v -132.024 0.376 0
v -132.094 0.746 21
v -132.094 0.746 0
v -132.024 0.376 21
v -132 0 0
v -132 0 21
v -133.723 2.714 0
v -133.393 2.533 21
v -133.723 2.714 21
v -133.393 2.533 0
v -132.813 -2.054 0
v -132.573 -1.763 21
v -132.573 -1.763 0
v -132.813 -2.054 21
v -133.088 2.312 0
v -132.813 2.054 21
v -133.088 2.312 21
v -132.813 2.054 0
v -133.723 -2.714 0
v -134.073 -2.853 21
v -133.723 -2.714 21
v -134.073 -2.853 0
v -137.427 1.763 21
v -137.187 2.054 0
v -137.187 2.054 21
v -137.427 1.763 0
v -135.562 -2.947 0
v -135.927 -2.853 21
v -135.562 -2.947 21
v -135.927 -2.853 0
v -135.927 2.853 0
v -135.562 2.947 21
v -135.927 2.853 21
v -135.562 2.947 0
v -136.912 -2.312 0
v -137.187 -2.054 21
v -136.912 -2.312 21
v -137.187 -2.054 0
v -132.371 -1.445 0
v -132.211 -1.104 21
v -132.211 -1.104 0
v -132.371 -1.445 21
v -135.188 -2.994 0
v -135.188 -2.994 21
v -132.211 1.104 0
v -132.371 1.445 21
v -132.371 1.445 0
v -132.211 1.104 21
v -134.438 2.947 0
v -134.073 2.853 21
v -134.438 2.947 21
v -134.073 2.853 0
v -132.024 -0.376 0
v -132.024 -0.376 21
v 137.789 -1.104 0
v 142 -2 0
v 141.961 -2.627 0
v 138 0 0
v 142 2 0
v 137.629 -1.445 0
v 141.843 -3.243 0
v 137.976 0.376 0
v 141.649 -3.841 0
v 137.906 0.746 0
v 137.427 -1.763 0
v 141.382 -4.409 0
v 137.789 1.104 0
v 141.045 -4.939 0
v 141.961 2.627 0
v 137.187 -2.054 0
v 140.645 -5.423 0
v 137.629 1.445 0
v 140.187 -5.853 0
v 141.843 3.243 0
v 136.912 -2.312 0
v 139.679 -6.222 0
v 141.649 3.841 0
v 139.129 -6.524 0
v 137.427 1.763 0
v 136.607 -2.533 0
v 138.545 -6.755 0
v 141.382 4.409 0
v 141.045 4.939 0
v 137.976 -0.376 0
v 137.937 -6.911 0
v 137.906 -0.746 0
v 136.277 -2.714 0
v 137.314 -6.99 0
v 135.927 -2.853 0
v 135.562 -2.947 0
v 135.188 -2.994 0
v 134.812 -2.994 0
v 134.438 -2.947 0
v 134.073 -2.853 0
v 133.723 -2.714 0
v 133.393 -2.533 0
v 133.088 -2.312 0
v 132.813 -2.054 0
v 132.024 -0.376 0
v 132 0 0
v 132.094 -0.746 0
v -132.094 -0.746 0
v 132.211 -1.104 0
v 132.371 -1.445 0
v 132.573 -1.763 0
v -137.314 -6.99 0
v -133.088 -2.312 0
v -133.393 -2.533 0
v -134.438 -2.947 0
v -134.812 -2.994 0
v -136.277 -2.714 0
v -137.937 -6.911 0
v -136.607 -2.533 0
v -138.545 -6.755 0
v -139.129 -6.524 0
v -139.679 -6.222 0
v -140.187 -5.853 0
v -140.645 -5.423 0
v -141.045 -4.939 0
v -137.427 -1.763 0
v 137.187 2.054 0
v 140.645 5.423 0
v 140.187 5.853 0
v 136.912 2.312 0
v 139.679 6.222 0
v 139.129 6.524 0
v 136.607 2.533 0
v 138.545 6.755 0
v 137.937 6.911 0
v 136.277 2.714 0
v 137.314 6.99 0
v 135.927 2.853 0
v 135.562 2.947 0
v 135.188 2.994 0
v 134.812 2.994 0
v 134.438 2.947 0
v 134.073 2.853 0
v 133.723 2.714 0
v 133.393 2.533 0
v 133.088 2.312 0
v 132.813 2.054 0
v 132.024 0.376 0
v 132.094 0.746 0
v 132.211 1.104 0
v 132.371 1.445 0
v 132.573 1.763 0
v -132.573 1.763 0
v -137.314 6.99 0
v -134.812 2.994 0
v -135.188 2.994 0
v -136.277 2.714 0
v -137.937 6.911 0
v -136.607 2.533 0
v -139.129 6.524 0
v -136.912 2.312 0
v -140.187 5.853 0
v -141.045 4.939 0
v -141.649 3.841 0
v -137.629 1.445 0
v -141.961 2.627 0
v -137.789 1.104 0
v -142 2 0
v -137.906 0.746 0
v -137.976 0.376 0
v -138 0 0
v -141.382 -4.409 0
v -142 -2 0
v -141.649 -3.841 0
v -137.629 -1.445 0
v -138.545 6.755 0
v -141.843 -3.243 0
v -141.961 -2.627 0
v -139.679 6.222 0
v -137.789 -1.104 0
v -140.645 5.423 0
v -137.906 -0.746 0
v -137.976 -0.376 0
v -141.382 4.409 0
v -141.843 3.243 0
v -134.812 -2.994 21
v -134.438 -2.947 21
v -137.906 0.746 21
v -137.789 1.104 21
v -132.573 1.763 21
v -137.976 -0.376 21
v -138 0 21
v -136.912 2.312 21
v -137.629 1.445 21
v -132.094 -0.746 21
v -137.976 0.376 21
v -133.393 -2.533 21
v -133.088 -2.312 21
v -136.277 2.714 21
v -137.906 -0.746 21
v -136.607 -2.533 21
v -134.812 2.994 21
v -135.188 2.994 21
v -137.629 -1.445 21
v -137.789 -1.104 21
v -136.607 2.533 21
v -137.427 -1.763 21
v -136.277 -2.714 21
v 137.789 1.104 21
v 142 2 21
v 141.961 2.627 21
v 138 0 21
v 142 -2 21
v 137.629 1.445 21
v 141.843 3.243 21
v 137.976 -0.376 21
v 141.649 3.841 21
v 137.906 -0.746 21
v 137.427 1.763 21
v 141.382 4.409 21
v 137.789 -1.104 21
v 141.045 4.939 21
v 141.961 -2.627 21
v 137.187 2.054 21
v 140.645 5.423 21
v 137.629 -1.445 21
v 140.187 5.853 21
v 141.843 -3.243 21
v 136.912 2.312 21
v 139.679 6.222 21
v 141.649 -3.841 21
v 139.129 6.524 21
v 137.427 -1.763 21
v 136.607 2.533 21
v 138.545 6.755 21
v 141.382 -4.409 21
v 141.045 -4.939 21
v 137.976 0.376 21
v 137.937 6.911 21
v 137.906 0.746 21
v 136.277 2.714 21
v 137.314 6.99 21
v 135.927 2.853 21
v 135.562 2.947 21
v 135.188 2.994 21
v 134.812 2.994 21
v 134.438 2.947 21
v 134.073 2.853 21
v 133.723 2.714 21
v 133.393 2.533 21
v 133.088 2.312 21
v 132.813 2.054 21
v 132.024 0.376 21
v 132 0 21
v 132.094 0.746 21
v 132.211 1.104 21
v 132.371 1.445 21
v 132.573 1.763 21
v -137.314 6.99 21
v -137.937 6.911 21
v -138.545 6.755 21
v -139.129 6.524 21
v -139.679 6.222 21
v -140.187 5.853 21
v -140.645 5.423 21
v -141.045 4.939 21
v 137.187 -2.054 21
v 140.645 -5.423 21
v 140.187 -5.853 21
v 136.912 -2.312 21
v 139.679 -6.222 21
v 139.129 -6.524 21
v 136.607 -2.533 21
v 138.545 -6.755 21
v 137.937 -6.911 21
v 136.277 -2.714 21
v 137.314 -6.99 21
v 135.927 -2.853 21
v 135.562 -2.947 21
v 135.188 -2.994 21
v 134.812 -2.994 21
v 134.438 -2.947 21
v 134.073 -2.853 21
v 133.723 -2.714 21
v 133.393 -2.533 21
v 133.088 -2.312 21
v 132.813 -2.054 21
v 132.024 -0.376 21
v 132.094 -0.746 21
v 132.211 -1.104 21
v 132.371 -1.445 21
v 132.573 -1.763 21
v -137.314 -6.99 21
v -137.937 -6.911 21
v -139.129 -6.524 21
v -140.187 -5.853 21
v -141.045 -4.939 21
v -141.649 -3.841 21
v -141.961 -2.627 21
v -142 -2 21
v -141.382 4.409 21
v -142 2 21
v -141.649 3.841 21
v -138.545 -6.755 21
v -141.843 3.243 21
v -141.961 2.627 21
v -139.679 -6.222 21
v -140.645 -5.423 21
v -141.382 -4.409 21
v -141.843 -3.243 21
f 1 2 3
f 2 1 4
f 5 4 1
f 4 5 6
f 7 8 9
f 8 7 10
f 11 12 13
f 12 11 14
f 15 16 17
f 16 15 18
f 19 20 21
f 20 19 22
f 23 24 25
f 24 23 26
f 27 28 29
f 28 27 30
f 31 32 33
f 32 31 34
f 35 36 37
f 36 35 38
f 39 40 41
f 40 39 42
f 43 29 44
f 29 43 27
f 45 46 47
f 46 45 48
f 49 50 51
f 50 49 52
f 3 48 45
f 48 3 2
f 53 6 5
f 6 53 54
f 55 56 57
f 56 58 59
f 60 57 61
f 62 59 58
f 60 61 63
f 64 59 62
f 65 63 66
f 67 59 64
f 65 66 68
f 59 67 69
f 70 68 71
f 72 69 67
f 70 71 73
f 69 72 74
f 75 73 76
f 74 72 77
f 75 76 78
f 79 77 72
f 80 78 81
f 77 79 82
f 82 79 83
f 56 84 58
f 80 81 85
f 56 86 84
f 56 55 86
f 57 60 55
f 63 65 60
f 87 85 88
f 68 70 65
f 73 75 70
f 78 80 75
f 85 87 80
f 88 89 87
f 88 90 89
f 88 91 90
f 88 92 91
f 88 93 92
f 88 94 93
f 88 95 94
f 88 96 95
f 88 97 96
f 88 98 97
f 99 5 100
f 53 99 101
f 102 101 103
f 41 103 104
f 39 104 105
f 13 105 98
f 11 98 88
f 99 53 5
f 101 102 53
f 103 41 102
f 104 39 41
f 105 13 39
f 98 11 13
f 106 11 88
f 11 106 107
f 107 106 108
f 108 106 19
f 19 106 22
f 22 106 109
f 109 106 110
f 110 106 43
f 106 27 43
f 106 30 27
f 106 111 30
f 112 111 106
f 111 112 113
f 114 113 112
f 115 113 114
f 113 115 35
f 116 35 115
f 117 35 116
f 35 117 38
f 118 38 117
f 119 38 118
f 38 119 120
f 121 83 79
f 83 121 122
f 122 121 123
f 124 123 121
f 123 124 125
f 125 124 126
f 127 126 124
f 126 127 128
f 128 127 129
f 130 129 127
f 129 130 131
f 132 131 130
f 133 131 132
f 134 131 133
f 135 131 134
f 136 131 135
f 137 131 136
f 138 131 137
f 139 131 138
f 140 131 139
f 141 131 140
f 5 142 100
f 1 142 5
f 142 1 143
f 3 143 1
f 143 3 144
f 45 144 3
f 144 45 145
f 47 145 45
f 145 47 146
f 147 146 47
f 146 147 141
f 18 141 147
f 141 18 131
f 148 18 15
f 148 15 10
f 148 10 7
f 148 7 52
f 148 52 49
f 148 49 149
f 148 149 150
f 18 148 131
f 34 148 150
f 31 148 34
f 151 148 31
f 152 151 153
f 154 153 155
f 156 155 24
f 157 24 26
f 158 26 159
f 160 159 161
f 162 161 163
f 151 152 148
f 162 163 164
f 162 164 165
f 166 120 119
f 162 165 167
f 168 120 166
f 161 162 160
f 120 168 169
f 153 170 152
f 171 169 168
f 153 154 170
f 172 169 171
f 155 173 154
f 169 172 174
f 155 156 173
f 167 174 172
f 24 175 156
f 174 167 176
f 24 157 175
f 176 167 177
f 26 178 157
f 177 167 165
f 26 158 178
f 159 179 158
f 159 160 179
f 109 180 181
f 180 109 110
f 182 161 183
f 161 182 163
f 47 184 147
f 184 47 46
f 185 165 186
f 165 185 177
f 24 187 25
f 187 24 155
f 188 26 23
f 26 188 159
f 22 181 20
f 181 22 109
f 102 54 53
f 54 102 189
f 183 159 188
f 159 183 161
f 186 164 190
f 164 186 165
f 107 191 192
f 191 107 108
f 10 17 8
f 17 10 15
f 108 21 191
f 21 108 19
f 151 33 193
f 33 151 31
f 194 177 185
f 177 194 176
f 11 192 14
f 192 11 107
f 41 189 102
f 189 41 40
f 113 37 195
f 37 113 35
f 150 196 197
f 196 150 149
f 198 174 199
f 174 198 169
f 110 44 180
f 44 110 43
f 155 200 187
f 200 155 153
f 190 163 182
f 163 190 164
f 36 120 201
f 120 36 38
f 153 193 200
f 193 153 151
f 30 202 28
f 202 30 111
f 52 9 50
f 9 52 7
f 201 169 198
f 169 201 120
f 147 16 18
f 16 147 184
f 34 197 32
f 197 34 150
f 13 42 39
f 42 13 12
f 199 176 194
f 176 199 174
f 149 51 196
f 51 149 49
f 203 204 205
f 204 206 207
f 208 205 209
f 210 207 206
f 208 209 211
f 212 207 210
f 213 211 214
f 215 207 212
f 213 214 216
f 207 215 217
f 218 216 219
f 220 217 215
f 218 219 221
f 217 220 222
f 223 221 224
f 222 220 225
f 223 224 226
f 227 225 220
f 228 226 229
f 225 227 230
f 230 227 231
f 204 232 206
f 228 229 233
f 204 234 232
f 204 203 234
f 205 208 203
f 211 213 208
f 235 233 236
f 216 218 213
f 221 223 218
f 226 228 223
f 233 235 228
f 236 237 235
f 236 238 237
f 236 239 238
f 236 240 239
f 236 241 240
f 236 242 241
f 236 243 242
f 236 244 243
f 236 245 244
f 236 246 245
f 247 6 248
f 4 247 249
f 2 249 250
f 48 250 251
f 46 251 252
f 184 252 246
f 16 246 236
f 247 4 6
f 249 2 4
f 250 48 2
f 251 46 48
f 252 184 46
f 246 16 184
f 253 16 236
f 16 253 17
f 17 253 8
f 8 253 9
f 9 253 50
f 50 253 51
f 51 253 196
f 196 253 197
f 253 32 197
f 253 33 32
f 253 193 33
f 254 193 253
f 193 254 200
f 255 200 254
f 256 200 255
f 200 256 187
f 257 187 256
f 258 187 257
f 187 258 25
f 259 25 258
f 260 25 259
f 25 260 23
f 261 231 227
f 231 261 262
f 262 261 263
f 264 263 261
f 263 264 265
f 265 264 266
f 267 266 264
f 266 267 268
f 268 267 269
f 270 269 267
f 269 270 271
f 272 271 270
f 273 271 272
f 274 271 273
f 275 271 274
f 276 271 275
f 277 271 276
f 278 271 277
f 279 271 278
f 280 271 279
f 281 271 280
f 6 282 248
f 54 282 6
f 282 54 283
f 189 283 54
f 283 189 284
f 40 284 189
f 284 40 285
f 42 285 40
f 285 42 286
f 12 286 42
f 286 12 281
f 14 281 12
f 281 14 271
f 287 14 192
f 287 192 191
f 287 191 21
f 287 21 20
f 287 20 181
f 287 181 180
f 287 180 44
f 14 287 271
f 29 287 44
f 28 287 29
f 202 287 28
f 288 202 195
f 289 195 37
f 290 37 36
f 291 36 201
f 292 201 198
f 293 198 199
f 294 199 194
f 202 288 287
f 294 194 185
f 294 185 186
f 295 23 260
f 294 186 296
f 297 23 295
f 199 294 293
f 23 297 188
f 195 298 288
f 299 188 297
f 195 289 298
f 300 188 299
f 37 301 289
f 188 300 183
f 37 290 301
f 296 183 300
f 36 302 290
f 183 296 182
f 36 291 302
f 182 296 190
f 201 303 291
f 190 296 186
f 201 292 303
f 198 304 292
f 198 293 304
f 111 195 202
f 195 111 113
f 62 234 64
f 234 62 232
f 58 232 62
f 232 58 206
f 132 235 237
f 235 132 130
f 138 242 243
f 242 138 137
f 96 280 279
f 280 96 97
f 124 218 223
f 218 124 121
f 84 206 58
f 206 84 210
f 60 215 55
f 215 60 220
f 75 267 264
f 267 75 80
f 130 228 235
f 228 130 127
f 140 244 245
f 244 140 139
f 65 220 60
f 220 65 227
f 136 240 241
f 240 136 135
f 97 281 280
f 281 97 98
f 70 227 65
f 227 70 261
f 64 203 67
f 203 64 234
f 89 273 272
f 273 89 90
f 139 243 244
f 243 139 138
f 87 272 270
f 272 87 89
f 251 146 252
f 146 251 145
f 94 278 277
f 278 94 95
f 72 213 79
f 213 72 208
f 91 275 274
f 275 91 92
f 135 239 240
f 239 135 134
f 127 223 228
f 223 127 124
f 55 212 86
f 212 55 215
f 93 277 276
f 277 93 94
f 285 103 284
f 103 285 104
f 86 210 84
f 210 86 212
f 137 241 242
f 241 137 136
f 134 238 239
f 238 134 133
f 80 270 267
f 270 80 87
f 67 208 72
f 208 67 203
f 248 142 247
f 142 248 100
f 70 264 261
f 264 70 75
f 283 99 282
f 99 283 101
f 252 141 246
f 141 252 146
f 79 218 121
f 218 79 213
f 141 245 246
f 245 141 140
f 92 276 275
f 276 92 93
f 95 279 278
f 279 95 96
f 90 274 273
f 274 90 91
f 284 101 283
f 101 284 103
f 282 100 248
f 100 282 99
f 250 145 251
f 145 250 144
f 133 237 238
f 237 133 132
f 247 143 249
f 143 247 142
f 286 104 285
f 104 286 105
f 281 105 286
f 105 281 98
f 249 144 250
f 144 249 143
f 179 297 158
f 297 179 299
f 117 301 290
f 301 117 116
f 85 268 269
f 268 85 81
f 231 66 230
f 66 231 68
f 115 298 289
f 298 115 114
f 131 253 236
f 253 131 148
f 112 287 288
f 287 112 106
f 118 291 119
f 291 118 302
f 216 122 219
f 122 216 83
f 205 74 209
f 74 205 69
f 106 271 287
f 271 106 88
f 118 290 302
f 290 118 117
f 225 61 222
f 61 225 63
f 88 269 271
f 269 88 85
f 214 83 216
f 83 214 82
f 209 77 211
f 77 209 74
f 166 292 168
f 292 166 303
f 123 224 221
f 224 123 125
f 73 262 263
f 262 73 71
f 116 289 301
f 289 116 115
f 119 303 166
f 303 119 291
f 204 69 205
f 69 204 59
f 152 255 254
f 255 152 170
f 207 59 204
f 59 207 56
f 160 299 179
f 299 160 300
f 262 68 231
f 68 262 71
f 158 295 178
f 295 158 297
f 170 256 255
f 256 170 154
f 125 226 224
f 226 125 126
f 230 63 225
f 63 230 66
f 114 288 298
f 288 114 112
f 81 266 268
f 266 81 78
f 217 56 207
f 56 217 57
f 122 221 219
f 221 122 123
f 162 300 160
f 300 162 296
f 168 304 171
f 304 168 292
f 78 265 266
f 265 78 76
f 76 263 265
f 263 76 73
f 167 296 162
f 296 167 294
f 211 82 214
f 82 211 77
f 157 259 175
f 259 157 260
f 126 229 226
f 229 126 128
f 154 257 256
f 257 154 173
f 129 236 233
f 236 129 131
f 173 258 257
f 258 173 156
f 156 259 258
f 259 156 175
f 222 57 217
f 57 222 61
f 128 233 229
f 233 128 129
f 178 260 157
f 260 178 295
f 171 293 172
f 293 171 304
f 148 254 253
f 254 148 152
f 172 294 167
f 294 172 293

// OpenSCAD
$fn = 50;


difference() {
	union() {
		hull() {
			translate(v = [-137.0000000000, 2.0000000000, 0]) {
				cylinder(h = 21, r = 5);
			}
			translate(v = [137.0000000000, 2.0000000000, 0]) {
				cylinder(h = 21, r = 5);
			}
			translate(v = [-137.0000000000, -2.0000000000, 0]) {
				cylinder(h = 21, r = 5);
			}
			translate(v = [137.0000000000, -2.0000000000, 0]) {
				cylinder(h = 21, r = 5);
			}
		}
	}
	union() {
		translate(v = [-135.0000000000, 0.0000000000, 0]) {
			cylinder(h = 21, r = 3.0000000000);
		}
		translate(v = [135.0000000000, 0.0000000000, 0]) {
			cylinder(h = 21, r = 3.0000000000);
		}
		translate(v = [-135.0000000000, 0.0000000000, 0]) {
			cylinder(h = 21, r = 1.5000000000);
		}
		translate(v = [135.0000000000, 0.0000000000, 0]) {
			cylinder(h = 21, r = 1.5000000000);
		}
		translate(v = [-135.0000000000, 0.0000000000, 0]) {
			cylinder(h = 21, r = 1.5000000000);
		}
		translate(v = [135.0000000000, 0.0000000000, 0]) {
			cylinder(h = 21, r = 1.5000000000);
		}
		translate(v = [-135.0000000000, 0.0000000000, 0]) {
			cylinder(h = 21, r = 1.5000000000);
		}
		translate(v = [135.0000000000, 0.0000000000, 0]) {
			cylinder(h = 21, r = 1.5000000000);
		}
	}
}
